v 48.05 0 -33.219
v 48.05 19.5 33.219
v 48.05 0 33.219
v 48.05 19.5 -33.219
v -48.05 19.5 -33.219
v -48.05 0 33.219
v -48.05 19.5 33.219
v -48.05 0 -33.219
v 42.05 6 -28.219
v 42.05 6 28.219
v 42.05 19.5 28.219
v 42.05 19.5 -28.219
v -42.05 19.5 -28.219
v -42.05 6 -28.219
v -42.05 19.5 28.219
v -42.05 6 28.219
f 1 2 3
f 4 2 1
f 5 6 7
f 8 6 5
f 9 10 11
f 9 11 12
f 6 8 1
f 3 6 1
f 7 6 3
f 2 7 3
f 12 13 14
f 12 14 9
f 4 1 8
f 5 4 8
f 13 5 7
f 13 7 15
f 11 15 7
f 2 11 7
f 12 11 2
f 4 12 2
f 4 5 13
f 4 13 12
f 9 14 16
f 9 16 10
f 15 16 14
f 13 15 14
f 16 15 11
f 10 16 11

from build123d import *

# Parameters (mm, degrees)
SKETCH1_W           = 97.6
SKETCH1_H           = 66.43745389
BOSS_EXTRUDE1_DEPTH = 6
SKETCH4_W           = 24.6
SKETCH4_H           = 54
SKETCH4_H_2         = 6.218726945
SKETCH4_W_2         = 55
SKETCH4_W_3         = 18
BOSS_EXTRUDE2_DEPTH = 13.5
SKETCH6_W           = 97.6
SKETCH6_H           = 56.43745389
CUT_EXTRUDE2_DEPTH  = 13.5
SKETCH7_W           = 66.43745389
SKETCH7_H           = 19.5
CUT_EXTRUDE3_DEPTH  = 0.75
SKETCH8_W           = 66.43745389
SKETCH8_H           = 19.5
CUT_EXTRUDE4_DEPTH  = 0.75
SKETCH9_W           = 6
SKETCH9_H           = 56.43745389
BOSS_EXTRUDE3_DEPTH = 13.5


with BuildPart() as part:
    # Sketch1 → Boss-Extrude1 (new body)
    with BuildSketch(Plane(origin=(0, 0, 0), x_dir=(1, 0, 0), z_dir=(0, 1, 0))):
        Rectangle(SKETCH1_W, SKETCH1_H)
    extrude(amount=BOSS_EXTRUDE1_DEPTH)

    # Sketch4 → Boss-Extrude2 (add)
    with BuildSketch(Plane(origin=(0, 6, 0), x_dir=(1, 0, 0), z_dir=(0, 1, 0))):
        with Locations((-36.5, 0)):
            Rectangle(SKETCH4_W, SKETCH4_H)
        with Locations((-36.5, -30.109363473)):
            Rectangle(SKETCH4_W, SKETCH4_H_2)
        with Locations((3.3, -30.109363473)):
            Rectangle(SKETCH4_W_2, SKETCH4_H_2)
        with Locations((39.8, -30.109363473)):
            Rectangle(SKETCH4_W_3, SKETCH4_H_2)
        with Locations((39.8, 0)):
            Rectangle(SKETCH4_W_3, SKETCH4_H)
        with Locations((39.8, 30.109363473)):
            Rectangle(SKETCH4_W_3, SKETCH4_H_2)
        with Locations((-36.5, 30.109363473)):
            Rectangle(SKETCH4_W, SKETCH4_H_2)
        with Locations((3.3, 30.109363473)):
            Rectangle(SKETCH4_W_2, SKETCH4_H_2)
    extrude(amount=BOSS_EXTRUDE2_DEPTH)

    # Sketch6 → Cut-Extrude2 (cut)
    with BuildSketch(Plane(origin=(0, 19.5, 0), x_dir=(1, 0, 0), z_dir=(0, 1, 0))):
        Rectangle(SKETCH6_W, SKETCH6_H)
    extrude(amount=-CUT_EXTRUDE2_DEPTH, mode=Mode.SUBTRACT)

    # Sketch7 → Cut-Extrude3 (cut)
    with BuildSketch(Plane(origin=(48.8, 0, 0), x_dir=(0, 0, -1), z_dir=(1, 0, 0))):
        with Locations((0, 9.75)):
            Rectangle(SKETCH7_W, SKETCH7_H)
    extrude(amount=-CUT_EXTRUDE3_DEPTH, mode=Mode.SUBTRACT)

    # Sketch8 → Cut-Extrude4 (cut)
    with BuildSketch(Plane.ZY.offset(48.8)):
        with Locations((0, 9.75)):
            Rectangle(SKETCH8_W, SKETCH8_H)
    extrude(amount=-CUT_EXTRUDE4_DEPTH, mode=Mode.SUBTRACT)

    # Sketch9 → Boss-Extrude3 (add)
    with BuildSketch(Plane(origin=(0, 6, 0), x_dir=(1, 0, 0), z_dir=(0, 1, 0))):
        with Locations((-45.05, 0)):
            Rectangle(SKETCH9_W, SKETCH9_H)
        with Locations((45.05, 0)):
            Rectangle(SKETCH9_W, SKETCH9_H)
    extrude(amount=BOSS_EXTRUDE3_DEPTH)


solid = part.part
